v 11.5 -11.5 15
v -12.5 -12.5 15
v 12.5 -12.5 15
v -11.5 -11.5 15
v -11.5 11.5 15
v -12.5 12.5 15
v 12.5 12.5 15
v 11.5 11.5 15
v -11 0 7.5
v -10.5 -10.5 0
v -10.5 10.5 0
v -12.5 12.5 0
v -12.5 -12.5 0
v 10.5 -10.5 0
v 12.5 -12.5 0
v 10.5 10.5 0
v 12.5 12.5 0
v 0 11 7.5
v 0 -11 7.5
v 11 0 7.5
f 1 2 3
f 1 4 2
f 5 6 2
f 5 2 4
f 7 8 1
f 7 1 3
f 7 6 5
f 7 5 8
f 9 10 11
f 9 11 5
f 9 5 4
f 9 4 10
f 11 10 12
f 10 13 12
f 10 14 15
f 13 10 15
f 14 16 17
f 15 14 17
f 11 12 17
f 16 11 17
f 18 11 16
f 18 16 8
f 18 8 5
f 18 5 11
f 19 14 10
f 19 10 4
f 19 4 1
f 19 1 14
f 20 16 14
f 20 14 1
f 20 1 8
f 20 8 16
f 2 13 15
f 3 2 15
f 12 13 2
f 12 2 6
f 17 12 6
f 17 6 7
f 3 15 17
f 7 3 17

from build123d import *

# Parameters (mm, degrees)
SKETCH_W    = 25
SKETCH_H    = 25
PAD_DEPTH   = 15
SKETCH002_W = 21
SKETCH002_H = 21
SKETCH001_W = 23
SKETCH001_H = 23


with BuildPart() as part:
    # Sketch → Pad (new body)
    with BuildSketch(Plane.XY):
        Rectangle(SKETCH_W, SKETCH_H)
    extrude(amount=PAD_DEPTH)

    # Sketch002 (on Face5 of Pad) → SubtractiveLoft section 0
    with BuildSketch(Plane(origin=(0, 0, 0), x_dir=(1, 0, 0), z_dir=(0, 0, -1))):
        Rectangle(SKETCH002_W, SKETCH002_H)
    # Sketch001 (on Face6 of Pad) → SubtractiveLoft section 1
    with BuildSketch(Plane.XY.offset(15)):
        Rectangle(SKETCH001_W, SKETCH001_H)
    loft(mode=Mode.SUBTRACT)


solid = part.part
